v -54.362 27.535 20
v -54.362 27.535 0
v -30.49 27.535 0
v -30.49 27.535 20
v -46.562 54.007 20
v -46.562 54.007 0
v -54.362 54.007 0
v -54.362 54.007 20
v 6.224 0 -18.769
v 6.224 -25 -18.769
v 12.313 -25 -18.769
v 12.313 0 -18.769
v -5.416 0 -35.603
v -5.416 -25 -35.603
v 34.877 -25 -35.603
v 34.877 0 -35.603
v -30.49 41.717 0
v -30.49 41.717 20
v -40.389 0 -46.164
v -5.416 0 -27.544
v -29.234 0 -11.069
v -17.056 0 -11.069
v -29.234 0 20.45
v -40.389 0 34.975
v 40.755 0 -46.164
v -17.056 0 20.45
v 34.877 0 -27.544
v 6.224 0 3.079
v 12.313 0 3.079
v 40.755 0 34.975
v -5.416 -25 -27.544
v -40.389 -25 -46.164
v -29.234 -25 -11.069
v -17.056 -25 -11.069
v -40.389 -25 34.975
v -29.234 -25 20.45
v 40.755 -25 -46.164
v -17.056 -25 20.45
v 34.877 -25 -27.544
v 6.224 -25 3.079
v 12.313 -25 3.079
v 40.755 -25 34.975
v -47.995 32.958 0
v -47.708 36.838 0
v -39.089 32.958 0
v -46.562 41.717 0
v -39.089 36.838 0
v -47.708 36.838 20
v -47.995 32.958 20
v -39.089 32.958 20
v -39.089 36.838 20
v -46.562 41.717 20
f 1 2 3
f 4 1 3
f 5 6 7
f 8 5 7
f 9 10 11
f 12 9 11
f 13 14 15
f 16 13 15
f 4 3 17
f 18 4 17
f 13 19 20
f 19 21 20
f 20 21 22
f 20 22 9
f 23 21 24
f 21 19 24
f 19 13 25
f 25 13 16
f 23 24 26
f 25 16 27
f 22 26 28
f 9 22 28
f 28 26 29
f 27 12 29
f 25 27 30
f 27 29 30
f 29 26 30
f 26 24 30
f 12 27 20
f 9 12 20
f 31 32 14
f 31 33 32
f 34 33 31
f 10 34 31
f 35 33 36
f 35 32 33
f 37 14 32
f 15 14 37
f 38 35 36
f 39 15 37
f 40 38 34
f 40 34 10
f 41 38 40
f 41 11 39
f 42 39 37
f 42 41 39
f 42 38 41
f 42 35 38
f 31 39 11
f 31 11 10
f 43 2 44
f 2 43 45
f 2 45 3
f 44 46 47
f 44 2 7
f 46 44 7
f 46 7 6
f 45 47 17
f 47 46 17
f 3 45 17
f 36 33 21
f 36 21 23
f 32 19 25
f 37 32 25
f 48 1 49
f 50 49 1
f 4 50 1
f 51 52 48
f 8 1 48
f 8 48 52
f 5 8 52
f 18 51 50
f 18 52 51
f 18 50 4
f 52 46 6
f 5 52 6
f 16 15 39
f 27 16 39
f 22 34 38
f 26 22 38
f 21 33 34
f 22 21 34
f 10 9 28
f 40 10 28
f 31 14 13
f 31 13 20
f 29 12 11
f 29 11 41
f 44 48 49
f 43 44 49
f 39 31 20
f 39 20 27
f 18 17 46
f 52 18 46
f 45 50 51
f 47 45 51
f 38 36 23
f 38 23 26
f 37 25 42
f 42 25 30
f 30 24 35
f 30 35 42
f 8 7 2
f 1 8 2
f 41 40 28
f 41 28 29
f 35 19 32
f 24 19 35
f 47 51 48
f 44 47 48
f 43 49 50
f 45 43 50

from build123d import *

# Parameters (mm, degrees)
F0_W     = 81.144039
F0_H     = 81.139479
F1_DEPTH = 25
F2_W     = 12.177514
F2_H     = 31.518272
F2_W_2   = 6.088759
F2_H_2   = 21.847893
F2_W_3   = 40.293246
F2_H_3   = 8.058649
F3_DEPTH = 25.001
F5_DEPTH = 20
F7_DEPTH = 25


with BuildPart() as f1:
    # F0 (on Front) → F1 (new body)
    with BuildSketch(Plane.XZ):
        with Locations((0.182928, -5.594364)):
            Rectangle(F0_W, F0_H)
    extrude(amount=F1_DEPTH)

    # F2 (on face) → F3 (cut, through all)
    with BuildSketch(Plane.XZ.offset(25)):
        with Locations((-23.144861, 4.690515)):
            Rectangle(F2_W, F2_H)
        with Locations((9.268815, -7.845161)):
            Rectangle(F2_W_2, F2_H_2)
        with Locations((14.730789, -31.573405)):
            Rectangle(F2_W_3, F2_H_3)
    extrude(amount=-F3_DEPTH, mode=Mode.SUBTRACT)


with BuildPart() as f5:
    # F4 (on Top) → F5 (new body)
    with BuildSketch(Plane.XY):
        Polygon((-46.562009, 54.007202), (-54.361735, 54.007202), (-54.361735, 27.535399), (-30.489841, 27.535399), (-30.489841, 41.716721), (-46.562009, 41.716721), align=None)
    extrude(amount=F5_DEPTH)

    # F6 (on face) → F7 (cut)
    with BuildSketch(Plane.XY.offset(20)):
        Polygon((-47.707614, 36.837734), (-47.99547, 32.957833), (-39.088558, 32.957833), (-39.088558, 36.837734), align=None)
    extrude(amount=-F7_DEPTH, mode=Mode.SUBTRACT)


solid = Compound([f1.part, f5.part])
